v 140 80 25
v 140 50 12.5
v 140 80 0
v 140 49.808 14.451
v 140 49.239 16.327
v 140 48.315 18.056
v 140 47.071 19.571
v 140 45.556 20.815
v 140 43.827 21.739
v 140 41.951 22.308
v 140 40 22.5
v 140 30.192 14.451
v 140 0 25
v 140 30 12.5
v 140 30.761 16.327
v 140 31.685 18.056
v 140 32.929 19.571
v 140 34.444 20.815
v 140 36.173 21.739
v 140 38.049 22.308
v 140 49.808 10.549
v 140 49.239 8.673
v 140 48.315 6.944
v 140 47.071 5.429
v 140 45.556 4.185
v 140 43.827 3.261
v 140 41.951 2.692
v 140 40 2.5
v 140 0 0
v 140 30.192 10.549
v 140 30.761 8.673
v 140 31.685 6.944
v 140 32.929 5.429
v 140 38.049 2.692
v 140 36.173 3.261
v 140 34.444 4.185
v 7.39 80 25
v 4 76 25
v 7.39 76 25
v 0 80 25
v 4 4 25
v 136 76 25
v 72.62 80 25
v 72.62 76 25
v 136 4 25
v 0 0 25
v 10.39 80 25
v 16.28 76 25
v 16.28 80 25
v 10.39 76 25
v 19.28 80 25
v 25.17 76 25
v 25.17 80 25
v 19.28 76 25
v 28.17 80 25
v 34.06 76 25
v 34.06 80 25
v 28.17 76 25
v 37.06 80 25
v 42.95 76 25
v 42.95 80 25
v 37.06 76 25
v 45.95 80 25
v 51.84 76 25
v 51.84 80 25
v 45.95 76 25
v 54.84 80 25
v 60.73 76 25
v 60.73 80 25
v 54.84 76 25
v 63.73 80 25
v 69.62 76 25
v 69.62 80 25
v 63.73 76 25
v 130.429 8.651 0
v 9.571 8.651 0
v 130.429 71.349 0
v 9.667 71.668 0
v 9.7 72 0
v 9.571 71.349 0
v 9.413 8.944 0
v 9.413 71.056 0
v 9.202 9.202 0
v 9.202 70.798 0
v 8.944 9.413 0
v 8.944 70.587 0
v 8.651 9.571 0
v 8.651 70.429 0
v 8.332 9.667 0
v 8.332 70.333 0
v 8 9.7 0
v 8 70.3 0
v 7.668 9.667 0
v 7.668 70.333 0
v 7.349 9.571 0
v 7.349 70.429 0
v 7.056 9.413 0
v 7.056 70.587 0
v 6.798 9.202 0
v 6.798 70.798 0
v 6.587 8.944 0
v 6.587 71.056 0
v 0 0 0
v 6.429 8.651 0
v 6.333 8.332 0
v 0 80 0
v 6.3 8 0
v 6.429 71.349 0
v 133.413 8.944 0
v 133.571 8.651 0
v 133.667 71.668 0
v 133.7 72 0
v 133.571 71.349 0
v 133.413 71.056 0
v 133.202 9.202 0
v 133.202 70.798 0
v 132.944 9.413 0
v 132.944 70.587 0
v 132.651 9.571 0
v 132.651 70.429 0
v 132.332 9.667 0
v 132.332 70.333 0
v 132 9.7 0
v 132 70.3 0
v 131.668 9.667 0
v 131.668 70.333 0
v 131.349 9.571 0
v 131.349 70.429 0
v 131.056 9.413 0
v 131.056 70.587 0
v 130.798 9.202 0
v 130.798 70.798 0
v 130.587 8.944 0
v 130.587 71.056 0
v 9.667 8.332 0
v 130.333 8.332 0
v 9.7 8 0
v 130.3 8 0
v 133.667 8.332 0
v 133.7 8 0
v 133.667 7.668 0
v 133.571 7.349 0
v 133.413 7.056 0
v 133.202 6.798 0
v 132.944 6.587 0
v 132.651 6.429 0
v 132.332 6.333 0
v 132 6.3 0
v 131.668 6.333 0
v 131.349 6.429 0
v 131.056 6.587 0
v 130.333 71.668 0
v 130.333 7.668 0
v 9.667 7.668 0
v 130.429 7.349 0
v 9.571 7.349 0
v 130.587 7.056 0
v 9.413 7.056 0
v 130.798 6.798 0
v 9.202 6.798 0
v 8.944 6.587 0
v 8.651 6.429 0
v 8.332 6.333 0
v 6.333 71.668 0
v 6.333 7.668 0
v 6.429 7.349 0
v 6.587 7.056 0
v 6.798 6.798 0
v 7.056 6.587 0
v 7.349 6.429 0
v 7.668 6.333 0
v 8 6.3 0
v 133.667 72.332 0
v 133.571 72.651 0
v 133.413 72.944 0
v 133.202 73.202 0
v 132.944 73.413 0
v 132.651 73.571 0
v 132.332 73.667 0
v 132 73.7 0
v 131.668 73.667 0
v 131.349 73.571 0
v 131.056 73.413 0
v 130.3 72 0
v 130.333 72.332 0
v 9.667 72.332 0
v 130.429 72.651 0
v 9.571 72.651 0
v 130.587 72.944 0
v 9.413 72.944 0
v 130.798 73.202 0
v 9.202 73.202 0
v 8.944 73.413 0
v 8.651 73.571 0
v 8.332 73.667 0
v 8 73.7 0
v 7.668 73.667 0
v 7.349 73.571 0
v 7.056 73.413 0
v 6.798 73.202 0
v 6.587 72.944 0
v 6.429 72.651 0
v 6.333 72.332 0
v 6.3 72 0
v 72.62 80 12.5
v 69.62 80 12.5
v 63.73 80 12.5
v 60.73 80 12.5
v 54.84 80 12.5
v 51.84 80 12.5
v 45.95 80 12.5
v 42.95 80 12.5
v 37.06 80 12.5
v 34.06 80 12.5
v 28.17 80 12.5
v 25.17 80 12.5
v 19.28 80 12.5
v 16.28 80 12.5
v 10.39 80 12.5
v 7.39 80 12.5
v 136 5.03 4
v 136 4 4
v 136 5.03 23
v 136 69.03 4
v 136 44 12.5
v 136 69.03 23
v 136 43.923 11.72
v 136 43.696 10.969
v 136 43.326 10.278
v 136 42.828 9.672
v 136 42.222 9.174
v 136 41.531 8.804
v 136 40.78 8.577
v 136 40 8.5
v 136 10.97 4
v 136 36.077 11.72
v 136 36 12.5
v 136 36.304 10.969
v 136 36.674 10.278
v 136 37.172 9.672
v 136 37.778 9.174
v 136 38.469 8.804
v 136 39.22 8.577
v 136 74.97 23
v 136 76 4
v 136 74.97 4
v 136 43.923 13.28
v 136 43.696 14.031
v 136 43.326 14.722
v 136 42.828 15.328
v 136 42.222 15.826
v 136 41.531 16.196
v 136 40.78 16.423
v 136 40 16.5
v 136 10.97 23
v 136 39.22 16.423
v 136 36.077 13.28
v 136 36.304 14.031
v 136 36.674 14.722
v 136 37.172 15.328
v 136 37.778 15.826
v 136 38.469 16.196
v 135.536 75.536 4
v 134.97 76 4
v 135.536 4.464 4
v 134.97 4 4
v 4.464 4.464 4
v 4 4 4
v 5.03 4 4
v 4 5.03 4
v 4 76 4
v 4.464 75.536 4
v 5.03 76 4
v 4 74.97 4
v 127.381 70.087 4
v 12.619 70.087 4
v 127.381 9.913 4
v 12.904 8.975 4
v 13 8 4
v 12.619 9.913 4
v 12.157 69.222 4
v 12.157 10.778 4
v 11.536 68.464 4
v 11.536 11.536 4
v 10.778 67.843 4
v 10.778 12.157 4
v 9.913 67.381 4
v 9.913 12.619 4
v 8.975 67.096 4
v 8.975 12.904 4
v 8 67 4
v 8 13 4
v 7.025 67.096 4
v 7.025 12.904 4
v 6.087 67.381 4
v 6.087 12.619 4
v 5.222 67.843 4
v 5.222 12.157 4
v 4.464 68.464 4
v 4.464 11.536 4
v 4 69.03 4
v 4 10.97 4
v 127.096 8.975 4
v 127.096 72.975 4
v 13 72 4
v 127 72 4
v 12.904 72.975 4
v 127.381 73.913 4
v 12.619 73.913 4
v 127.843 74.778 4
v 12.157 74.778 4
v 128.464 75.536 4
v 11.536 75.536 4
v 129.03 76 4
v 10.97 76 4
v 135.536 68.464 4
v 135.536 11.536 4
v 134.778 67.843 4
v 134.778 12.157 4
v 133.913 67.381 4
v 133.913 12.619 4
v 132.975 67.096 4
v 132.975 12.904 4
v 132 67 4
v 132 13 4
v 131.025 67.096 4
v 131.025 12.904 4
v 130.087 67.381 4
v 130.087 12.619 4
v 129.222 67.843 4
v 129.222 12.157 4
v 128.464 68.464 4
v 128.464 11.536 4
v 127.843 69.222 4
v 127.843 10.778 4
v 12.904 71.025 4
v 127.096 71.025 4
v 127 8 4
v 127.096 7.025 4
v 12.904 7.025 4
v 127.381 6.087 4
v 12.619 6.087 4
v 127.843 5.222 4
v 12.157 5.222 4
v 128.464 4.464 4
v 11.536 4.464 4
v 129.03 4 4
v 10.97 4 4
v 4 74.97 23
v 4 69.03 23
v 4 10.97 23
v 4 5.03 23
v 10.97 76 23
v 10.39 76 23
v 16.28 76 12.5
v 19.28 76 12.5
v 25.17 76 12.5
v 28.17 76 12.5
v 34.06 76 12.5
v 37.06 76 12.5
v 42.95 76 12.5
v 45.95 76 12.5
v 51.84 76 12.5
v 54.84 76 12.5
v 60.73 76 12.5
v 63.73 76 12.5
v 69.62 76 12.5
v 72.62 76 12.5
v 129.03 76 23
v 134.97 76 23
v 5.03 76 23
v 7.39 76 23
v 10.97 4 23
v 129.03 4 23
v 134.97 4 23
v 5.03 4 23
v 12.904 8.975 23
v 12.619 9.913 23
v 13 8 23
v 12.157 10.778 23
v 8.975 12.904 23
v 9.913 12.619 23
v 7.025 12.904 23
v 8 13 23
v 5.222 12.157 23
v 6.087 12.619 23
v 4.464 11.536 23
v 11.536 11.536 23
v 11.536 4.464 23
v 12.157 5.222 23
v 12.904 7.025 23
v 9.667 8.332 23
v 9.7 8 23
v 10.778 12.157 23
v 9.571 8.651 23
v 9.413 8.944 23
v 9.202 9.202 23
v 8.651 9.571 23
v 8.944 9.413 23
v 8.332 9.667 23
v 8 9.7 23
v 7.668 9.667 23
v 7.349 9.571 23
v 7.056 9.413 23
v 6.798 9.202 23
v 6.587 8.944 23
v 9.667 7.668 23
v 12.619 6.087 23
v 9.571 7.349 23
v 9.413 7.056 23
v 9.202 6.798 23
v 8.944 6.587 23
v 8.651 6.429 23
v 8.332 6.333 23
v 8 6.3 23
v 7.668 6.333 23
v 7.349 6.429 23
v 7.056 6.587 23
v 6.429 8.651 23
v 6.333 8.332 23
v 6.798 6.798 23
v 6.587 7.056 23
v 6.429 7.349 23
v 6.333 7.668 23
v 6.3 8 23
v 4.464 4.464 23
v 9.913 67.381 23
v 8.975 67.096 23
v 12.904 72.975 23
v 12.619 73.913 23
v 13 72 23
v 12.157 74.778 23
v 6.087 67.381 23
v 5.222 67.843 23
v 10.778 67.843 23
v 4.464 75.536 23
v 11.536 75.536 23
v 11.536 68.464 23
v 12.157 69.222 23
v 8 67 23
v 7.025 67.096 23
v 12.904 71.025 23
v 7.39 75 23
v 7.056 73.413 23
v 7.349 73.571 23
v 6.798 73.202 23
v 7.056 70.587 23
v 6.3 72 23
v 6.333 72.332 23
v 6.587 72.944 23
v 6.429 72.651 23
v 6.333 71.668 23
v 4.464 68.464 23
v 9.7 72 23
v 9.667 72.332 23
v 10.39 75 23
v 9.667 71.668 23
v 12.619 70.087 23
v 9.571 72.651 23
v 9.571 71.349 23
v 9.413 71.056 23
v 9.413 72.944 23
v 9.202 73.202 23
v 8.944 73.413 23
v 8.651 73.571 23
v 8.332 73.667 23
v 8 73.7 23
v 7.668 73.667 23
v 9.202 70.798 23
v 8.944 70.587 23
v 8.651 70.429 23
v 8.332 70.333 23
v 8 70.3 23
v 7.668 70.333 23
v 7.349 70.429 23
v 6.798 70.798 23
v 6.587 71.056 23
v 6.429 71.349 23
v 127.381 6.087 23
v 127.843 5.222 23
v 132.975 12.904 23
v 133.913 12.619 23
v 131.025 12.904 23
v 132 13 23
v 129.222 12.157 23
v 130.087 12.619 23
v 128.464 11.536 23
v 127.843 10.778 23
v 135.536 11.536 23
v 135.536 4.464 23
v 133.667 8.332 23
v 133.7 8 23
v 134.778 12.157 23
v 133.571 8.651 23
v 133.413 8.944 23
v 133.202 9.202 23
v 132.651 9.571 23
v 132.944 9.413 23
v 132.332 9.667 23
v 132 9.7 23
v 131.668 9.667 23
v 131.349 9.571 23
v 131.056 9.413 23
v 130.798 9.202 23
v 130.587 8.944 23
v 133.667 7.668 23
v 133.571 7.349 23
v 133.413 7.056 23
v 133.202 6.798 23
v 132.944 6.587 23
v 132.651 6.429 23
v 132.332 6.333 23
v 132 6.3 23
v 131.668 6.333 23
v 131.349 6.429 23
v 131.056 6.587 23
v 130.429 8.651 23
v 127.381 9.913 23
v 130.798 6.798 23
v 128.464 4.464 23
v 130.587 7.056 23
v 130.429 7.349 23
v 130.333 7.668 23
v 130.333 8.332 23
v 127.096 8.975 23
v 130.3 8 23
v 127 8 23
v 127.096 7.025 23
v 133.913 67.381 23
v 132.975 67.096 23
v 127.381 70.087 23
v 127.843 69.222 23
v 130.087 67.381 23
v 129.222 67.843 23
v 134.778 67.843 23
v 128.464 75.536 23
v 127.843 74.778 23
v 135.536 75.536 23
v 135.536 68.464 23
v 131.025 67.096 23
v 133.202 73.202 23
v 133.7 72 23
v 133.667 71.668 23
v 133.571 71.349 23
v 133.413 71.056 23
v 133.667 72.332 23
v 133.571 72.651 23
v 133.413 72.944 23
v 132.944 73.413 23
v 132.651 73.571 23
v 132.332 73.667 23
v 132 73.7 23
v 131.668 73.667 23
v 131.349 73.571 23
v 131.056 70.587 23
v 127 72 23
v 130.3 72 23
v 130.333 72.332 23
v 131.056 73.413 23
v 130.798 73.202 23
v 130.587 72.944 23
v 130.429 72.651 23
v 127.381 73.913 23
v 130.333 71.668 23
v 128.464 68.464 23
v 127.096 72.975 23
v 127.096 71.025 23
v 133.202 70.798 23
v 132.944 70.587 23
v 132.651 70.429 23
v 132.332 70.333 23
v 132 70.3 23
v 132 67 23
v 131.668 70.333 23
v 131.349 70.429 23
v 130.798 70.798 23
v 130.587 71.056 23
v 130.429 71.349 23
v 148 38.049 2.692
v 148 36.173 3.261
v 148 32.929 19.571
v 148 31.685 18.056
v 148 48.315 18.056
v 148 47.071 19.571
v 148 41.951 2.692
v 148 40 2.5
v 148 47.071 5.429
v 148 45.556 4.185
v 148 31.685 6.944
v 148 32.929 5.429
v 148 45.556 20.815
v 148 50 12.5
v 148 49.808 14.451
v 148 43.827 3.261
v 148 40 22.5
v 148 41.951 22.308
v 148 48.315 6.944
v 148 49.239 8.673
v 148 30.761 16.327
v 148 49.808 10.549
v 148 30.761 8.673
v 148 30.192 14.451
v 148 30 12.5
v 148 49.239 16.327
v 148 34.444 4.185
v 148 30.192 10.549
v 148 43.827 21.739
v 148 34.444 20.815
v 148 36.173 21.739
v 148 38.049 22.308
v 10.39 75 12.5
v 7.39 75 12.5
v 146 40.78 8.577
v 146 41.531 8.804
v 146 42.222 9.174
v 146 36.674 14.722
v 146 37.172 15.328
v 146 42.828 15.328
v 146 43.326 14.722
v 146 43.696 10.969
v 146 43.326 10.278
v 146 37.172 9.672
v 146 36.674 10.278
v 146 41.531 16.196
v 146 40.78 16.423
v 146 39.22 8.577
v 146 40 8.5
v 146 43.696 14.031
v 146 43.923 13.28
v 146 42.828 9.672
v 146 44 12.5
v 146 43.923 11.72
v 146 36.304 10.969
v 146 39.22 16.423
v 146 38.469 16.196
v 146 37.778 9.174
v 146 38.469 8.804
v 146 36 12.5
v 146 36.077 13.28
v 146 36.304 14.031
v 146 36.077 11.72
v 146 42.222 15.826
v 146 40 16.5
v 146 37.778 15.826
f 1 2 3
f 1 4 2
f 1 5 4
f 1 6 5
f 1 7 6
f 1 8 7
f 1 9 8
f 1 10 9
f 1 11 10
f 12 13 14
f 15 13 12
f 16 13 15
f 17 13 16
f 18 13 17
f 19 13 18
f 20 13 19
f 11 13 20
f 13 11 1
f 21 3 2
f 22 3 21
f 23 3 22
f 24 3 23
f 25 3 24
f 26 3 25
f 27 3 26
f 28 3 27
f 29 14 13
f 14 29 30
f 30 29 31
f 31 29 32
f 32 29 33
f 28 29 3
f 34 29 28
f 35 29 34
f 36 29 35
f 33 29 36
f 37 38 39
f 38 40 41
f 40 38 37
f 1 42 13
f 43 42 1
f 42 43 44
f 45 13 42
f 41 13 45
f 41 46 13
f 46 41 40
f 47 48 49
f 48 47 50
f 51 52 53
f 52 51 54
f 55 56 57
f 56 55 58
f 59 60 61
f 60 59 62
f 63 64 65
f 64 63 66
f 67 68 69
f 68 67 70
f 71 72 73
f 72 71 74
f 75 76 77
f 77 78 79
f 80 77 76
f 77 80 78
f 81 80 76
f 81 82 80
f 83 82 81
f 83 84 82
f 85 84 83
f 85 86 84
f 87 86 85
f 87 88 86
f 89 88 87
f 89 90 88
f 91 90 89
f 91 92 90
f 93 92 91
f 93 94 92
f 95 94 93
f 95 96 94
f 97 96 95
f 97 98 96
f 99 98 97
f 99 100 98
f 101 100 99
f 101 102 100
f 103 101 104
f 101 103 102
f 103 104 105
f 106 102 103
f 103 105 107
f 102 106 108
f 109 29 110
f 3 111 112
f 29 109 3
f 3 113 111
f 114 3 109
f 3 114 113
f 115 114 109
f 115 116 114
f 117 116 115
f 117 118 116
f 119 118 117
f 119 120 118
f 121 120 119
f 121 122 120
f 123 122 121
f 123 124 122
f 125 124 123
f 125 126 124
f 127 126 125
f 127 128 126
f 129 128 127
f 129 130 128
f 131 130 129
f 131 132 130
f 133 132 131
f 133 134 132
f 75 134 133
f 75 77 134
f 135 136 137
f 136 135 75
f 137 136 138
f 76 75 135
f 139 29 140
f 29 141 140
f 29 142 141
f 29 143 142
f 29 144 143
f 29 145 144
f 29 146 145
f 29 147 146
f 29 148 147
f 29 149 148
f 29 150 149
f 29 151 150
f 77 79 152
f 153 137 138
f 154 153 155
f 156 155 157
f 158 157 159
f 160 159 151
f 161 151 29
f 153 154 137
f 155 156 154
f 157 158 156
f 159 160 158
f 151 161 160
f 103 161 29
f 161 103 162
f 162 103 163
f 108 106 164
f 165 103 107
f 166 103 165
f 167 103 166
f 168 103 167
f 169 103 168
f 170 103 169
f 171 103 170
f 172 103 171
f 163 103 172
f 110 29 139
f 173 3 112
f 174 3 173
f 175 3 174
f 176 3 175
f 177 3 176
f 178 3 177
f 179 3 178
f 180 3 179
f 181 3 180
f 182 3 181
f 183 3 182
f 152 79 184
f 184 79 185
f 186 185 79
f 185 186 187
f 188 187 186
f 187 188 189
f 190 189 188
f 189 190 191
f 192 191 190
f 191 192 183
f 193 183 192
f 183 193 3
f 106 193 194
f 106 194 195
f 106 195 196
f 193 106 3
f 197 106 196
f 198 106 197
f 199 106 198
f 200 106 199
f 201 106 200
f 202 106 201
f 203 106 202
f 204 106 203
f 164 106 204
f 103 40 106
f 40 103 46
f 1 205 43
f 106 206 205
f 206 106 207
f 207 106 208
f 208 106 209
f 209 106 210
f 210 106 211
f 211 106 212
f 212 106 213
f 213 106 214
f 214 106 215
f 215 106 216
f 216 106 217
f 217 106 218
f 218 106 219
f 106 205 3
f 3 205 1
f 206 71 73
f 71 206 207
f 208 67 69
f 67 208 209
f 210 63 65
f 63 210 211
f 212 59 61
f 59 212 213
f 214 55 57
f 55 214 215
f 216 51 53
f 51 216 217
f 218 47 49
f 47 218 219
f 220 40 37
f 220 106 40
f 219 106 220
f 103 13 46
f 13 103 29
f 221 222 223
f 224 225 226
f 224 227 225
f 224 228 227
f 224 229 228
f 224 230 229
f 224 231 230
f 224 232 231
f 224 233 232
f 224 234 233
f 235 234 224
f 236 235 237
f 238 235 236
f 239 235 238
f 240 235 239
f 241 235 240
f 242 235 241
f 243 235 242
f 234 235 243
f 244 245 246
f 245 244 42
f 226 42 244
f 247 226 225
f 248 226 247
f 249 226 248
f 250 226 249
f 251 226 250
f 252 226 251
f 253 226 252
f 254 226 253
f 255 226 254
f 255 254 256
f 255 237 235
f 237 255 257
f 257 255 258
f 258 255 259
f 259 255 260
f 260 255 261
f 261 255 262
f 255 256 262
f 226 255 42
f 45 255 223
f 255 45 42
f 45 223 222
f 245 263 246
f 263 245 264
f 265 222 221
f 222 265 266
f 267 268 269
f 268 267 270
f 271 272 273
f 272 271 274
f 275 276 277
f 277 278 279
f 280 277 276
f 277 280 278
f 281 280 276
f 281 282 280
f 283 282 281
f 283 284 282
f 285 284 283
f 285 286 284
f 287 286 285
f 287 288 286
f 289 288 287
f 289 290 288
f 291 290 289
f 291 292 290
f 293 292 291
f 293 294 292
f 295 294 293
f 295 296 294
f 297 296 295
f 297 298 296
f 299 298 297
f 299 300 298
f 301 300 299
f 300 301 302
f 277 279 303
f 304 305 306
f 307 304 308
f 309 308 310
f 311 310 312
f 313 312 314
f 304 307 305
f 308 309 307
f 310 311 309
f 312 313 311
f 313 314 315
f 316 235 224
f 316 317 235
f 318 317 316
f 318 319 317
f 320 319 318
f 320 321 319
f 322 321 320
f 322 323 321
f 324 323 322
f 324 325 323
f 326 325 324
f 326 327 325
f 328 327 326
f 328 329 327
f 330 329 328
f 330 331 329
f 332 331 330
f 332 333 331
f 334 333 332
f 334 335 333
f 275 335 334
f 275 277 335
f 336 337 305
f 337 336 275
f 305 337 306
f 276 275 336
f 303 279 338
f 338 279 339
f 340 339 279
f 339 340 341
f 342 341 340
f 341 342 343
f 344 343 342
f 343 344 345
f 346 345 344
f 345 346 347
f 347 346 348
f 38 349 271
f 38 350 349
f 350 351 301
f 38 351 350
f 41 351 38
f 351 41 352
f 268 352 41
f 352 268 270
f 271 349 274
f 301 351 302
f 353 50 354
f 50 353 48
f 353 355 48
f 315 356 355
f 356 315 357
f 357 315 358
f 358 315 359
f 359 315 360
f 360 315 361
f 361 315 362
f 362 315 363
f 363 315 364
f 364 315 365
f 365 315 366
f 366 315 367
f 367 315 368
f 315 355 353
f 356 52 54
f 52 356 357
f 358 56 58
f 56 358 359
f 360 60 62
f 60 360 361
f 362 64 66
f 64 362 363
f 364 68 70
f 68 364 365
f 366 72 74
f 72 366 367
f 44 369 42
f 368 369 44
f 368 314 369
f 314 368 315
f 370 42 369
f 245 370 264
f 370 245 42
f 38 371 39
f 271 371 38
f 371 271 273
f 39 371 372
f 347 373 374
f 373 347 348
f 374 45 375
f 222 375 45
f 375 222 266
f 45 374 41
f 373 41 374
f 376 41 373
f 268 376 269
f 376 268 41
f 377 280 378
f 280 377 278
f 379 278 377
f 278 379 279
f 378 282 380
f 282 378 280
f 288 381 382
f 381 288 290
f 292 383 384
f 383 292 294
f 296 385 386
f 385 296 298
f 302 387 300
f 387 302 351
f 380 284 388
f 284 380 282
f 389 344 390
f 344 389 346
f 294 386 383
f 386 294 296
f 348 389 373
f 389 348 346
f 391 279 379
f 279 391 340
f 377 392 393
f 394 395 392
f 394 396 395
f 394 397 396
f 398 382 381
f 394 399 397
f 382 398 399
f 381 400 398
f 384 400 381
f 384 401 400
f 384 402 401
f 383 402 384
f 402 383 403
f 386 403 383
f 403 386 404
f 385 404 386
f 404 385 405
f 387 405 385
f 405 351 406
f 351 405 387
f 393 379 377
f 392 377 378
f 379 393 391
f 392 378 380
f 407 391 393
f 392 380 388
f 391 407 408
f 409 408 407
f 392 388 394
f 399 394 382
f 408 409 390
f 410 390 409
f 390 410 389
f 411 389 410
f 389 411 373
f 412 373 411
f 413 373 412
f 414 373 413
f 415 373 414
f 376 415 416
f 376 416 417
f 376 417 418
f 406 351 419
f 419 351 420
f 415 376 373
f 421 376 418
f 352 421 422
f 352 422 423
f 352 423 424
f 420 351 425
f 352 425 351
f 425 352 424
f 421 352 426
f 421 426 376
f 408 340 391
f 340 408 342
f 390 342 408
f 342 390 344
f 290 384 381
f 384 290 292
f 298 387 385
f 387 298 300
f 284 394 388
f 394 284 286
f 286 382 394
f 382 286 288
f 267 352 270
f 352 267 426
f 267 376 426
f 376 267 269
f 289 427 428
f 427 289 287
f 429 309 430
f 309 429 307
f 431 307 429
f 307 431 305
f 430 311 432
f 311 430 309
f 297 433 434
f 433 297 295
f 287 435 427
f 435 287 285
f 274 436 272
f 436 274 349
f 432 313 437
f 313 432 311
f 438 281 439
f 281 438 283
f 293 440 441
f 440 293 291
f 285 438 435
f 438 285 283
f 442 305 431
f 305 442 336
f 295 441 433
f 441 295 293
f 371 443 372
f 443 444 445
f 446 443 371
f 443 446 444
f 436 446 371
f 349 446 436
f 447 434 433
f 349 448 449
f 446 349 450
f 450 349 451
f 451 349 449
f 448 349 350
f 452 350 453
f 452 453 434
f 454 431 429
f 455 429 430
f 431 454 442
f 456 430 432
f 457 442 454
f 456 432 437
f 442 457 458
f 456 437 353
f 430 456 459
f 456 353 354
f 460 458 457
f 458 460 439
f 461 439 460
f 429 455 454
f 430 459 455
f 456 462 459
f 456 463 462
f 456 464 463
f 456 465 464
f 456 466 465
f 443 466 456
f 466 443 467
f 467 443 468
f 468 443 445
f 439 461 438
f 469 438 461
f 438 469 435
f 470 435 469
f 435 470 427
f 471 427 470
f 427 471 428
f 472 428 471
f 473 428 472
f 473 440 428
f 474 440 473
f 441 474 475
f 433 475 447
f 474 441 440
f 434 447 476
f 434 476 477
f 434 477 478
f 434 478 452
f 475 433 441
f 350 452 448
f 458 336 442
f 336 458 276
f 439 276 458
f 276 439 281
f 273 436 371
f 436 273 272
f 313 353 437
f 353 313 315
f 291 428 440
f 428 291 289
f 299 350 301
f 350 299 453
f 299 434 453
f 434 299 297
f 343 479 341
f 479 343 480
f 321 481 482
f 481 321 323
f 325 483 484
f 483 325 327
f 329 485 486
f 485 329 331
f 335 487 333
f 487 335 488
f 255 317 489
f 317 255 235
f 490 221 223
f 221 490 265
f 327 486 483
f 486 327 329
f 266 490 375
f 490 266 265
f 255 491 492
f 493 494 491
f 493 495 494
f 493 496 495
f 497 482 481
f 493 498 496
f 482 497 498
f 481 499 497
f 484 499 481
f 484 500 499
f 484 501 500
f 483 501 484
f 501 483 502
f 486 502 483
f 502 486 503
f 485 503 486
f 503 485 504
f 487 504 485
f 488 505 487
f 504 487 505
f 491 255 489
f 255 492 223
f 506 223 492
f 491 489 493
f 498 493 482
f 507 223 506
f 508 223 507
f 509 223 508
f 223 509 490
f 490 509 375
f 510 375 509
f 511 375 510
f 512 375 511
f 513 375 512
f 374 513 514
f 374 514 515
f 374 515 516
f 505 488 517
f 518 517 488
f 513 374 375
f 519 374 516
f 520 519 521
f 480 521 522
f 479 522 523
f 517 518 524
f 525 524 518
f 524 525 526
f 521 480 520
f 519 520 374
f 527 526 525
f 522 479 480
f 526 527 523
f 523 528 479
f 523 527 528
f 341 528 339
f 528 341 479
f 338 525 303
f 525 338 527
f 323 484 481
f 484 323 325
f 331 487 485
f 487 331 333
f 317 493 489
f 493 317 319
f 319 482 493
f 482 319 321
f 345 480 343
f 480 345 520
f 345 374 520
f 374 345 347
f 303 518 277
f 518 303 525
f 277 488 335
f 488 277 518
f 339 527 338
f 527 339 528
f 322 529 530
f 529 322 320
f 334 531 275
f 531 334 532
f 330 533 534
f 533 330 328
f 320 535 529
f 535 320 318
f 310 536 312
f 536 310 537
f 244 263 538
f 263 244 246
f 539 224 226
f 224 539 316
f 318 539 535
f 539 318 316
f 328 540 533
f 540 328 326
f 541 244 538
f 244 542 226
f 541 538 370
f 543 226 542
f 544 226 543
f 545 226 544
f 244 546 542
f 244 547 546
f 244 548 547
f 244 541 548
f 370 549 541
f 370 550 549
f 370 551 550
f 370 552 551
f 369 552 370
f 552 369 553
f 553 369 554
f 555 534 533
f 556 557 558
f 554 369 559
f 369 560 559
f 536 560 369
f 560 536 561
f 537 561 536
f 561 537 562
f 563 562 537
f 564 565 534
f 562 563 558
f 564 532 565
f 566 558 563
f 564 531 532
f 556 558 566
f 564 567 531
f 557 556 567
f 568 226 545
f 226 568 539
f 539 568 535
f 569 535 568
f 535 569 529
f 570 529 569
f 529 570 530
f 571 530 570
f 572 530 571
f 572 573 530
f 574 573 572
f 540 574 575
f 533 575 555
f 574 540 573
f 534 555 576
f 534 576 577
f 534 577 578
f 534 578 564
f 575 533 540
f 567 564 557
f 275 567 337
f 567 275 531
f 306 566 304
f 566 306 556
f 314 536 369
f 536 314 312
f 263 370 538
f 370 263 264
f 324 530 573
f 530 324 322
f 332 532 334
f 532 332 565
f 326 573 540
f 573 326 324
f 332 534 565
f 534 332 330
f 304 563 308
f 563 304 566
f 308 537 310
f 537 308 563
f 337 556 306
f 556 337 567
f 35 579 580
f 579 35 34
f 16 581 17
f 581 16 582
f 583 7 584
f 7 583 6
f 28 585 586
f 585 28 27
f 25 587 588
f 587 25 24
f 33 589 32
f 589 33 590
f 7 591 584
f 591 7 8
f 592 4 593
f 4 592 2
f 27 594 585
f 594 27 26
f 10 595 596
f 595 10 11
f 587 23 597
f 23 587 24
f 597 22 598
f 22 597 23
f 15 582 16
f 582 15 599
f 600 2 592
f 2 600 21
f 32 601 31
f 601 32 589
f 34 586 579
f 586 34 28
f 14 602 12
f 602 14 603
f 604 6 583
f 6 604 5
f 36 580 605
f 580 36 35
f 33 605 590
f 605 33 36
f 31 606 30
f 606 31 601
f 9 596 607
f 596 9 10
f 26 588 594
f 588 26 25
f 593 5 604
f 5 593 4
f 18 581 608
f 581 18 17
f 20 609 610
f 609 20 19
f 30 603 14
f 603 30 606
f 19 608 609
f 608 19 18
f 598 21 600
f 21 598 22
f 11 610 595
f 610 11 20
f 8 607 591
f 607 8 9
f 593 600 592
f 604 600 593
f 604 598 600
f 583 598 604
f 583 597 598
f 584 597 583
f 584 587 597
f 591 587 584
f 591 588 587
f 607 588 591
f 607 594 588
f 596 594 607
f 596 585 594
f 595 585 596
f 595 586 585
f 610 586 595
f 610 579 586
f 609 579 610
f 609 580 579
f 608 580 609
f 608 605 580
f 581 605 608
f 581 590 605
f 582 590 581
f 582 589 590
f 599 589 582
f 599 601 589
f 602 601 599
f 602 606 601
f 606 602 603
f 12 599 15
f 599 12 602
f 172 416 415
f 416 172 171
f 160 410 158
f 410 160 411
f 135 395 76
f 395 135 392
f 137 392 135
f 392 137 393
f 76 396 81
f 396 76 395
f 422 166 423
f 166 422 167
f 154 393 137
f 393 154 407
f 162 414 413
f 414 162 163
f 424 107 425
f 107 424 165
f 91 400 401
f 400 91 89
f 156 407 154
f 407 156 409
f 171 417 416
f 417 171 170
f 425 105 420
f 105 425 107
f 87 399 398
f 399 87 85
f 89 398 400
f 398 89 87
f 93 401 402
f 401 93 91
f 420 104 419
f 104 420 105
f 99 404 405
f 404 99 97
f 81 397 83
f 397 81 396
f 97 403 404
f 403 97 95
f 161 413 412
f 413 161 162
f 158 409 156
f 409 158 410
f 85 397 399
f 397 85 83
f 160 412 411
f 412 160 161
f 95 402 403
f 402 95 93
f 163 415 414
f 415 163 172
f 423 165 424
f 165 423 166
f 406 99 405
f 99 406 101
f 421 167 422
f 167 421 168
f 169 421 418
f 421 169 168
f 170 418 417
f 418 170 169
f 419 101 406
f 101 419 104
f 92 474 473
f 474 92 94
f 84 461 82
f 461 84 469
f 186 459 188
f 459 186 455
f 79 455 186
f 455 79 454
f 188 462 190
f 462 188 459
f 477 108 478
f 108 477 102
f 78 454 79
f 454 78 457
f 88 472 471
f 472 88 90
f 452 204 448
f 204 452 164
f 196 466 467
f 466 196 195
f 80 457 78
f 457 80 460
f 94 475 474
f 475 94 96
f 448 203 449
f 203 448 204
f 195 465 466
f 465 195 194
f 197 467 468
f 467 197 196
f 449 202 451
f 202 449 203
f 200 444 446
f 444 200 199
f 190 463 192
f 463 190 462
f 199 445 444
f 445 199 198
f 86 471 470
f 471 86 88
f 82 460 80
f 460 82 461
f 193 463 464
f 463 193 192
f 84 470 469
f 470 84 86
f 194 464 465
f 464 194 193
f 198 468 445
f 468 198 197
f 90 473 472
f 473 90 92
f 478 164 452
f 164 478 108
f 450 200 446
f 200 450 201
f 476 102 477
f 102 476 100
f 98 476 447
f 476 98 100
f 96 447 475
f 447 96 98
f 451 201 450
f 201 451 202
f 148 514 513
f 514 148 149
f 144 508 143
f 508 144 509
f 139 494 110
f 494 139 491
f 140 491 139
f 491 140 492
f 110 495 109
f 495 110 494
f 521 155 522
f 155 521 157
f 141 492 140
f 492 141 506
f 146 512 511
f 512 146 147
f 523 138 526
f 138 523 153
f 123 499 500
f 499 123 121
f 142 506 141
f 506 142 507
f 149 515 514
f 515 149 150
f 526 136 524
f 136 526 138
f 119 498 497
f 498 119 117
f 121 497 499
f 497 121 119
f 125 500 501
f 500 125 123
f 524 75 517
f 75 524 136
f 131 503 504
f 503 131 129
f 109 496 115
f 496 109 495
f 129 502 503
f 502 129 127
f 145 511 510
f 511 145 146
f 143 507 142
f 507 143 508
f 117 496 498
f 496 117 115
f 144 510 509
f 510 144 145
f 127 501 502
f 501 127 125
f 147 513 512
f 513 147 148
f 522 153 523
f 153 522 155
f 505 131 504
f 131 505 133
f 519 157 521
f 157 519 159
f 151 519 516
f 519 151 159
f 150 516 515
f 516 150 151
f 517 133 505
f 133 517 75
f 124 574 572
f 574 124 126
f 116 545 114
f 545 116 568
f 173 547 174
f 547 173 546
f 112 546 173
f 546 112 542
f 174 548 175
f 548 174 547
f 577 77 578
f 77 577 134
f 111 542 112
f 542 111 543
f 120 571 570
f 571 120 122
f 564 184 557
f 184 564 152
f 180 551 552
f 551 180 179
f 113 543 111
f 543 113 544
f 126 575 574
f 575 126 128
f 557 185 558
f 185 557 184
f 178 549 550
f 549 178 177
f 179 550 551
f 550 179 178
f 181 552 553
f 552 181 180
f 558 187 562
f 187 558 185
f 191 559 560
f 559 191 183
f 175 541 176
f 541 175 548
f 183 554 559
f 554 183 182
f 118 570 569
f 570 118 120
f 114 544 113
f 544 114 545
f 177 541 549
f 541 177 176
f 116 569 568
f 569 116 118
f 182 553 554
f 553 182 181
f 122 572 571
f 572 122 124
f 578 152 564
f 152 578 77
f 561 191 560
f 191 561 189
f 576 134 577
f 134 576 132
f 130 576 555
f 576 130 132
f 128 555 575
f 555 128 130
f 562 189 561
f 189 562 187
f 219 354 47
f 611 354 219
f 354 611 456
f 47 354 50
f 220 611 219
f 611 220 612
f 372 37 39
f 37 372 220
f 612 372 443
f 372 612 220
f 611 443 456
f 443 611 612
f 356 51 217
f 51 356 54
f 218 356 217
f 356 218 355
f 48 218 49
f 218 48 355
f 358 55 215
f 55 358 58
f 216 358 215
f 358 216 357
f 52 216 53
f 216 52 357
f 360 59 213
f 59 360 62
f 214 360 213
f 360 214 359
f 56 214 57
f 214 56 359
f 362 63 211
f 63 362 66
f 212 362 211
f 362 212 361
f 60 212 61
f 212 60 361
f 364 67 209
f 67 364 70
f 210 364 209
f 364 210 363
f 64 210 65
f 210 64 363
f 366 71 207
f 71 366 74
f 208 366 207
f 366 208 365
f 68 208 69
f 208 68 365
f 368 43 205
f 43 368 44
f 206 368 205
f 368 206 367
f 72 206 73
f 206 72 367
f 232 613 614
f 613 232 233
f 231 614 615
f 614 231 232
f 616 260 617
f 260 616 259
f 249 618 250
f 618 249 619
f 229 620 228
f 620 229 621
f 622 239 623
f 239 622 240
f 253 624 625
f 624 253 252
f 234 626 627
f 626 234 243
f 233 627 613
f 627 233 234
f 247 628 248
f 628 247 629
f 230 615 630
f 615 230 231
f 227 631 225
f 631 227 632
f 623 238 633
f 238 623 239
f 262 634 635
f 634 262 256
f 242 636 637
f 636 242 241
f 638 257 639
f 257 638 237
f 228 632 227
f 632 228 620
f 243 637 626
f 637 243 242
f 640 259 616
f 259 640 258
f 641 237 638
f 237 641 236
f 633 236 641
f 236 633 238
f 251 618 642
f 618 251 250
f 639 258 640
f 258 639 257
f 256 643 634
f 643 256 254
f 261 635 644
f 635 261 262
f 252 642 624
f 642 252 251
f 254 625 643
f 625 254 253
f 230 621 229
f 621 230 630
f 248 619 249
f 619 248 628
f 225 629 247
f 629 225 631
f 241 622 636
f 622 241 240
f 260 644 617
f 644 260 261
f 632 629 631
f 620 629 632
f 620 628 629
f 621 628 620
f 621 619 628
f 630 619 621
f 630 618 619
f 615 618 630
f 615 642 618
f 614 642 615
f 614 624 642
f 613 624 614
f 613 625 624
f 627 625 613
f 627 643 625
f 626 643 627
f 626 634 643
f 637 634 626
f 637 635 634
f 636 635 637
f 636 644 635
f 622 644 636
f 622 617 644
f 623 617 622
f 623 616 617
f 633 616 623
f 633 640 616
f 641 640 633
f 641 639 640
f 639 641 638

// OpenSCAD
$fn = 32;

// ----------------------------------------------------------------------
// Enclosure body: 140 x 80 x 25 mm, wall 4 mm
// ----------------------------------------------------------------------

// --- parameters (mm) ---
length = 140;             // outside length, X
width = 80;               // outside width, Y
height = 25;              // outside height, Z
wall = 4;                 // side wall thickness
floor_t = 4;              // floor thickness
boss_d = 10;              // corner boss diameter
boss_h = 19;              // corner boss height above the floor
boss_hole_d = 3.4;        // lid screw clearance in the boss
boss_lip = 8;             // boss centre inset from the corner
vent_slots = 8;           // vent slots in the long wall
vent_w = 3;               // vent slot width
vent_h = 20;              // vent slot height
vent_pitch = 8.89;        // vent slot pitch
vent_z = 12.5;            // vent slot sill height
nipple_d = 20;            // cable gland boss diameter
nipple_h = 8;             // cable gland boss height
nipple_bore = 8;          // cable gland bore

module shell() {
  difference() {
    cube([length, width, height]);
    /* hollow, open at the top */
    translate([wall, wall, floor_t])
      cube([length - 2 * wall, width - 2 * wall, height]);
  }
}

module bosses() {
  /* corner bosses, sunk 1 mm into the floor */
  for (sx = [0, 1]) for (sy = [0, 1])
    translate([sx * (length - 2 * boss_lip) + boss_lip, sy * (width - 2 * boss_lip) + boss_lip, floor_t - 1])
      cylinder(h = boss_h + 1, d = boss_d);
}

module gland() {
  /* boss on the short wall, sunk 1 mm into it */
  translate([length - 1, width / 2, height * 0.5]) rotate([0, 90, 0])
    cylinder(h = nipple_h + 1, d = nipple_d);
}

difference() {
  union() {
    shell();
    bosses();
    gland();
  }
  /* boss screw holes */
  for (sx = [0, 1]) for (sy = [0, 1])
    translate([sx * (length - 2 * boss_lip) + boss_lip, sy * (width - 2 * boss_lip) + boss_lip, -1]) cylinder(h = floor_t + boss_h + 2, d = boss_hole_d);
  /* vent grille in the +Y wall */
  for (i = [0 : vent_slots - 1]) translate([vent_pitch * (i + 1) - vent_w / 2, width - wall - 1, vent_z]) cube([vent_w, wall + 2, vent_h]);
  translate([length, width / 2, height * 0.5]) rotate([0, 90, 0]) translate([0, 0, -nipple_h - 2]) cylinder(h = nipple_h + wall + 4, d = nipple_bore);
}
